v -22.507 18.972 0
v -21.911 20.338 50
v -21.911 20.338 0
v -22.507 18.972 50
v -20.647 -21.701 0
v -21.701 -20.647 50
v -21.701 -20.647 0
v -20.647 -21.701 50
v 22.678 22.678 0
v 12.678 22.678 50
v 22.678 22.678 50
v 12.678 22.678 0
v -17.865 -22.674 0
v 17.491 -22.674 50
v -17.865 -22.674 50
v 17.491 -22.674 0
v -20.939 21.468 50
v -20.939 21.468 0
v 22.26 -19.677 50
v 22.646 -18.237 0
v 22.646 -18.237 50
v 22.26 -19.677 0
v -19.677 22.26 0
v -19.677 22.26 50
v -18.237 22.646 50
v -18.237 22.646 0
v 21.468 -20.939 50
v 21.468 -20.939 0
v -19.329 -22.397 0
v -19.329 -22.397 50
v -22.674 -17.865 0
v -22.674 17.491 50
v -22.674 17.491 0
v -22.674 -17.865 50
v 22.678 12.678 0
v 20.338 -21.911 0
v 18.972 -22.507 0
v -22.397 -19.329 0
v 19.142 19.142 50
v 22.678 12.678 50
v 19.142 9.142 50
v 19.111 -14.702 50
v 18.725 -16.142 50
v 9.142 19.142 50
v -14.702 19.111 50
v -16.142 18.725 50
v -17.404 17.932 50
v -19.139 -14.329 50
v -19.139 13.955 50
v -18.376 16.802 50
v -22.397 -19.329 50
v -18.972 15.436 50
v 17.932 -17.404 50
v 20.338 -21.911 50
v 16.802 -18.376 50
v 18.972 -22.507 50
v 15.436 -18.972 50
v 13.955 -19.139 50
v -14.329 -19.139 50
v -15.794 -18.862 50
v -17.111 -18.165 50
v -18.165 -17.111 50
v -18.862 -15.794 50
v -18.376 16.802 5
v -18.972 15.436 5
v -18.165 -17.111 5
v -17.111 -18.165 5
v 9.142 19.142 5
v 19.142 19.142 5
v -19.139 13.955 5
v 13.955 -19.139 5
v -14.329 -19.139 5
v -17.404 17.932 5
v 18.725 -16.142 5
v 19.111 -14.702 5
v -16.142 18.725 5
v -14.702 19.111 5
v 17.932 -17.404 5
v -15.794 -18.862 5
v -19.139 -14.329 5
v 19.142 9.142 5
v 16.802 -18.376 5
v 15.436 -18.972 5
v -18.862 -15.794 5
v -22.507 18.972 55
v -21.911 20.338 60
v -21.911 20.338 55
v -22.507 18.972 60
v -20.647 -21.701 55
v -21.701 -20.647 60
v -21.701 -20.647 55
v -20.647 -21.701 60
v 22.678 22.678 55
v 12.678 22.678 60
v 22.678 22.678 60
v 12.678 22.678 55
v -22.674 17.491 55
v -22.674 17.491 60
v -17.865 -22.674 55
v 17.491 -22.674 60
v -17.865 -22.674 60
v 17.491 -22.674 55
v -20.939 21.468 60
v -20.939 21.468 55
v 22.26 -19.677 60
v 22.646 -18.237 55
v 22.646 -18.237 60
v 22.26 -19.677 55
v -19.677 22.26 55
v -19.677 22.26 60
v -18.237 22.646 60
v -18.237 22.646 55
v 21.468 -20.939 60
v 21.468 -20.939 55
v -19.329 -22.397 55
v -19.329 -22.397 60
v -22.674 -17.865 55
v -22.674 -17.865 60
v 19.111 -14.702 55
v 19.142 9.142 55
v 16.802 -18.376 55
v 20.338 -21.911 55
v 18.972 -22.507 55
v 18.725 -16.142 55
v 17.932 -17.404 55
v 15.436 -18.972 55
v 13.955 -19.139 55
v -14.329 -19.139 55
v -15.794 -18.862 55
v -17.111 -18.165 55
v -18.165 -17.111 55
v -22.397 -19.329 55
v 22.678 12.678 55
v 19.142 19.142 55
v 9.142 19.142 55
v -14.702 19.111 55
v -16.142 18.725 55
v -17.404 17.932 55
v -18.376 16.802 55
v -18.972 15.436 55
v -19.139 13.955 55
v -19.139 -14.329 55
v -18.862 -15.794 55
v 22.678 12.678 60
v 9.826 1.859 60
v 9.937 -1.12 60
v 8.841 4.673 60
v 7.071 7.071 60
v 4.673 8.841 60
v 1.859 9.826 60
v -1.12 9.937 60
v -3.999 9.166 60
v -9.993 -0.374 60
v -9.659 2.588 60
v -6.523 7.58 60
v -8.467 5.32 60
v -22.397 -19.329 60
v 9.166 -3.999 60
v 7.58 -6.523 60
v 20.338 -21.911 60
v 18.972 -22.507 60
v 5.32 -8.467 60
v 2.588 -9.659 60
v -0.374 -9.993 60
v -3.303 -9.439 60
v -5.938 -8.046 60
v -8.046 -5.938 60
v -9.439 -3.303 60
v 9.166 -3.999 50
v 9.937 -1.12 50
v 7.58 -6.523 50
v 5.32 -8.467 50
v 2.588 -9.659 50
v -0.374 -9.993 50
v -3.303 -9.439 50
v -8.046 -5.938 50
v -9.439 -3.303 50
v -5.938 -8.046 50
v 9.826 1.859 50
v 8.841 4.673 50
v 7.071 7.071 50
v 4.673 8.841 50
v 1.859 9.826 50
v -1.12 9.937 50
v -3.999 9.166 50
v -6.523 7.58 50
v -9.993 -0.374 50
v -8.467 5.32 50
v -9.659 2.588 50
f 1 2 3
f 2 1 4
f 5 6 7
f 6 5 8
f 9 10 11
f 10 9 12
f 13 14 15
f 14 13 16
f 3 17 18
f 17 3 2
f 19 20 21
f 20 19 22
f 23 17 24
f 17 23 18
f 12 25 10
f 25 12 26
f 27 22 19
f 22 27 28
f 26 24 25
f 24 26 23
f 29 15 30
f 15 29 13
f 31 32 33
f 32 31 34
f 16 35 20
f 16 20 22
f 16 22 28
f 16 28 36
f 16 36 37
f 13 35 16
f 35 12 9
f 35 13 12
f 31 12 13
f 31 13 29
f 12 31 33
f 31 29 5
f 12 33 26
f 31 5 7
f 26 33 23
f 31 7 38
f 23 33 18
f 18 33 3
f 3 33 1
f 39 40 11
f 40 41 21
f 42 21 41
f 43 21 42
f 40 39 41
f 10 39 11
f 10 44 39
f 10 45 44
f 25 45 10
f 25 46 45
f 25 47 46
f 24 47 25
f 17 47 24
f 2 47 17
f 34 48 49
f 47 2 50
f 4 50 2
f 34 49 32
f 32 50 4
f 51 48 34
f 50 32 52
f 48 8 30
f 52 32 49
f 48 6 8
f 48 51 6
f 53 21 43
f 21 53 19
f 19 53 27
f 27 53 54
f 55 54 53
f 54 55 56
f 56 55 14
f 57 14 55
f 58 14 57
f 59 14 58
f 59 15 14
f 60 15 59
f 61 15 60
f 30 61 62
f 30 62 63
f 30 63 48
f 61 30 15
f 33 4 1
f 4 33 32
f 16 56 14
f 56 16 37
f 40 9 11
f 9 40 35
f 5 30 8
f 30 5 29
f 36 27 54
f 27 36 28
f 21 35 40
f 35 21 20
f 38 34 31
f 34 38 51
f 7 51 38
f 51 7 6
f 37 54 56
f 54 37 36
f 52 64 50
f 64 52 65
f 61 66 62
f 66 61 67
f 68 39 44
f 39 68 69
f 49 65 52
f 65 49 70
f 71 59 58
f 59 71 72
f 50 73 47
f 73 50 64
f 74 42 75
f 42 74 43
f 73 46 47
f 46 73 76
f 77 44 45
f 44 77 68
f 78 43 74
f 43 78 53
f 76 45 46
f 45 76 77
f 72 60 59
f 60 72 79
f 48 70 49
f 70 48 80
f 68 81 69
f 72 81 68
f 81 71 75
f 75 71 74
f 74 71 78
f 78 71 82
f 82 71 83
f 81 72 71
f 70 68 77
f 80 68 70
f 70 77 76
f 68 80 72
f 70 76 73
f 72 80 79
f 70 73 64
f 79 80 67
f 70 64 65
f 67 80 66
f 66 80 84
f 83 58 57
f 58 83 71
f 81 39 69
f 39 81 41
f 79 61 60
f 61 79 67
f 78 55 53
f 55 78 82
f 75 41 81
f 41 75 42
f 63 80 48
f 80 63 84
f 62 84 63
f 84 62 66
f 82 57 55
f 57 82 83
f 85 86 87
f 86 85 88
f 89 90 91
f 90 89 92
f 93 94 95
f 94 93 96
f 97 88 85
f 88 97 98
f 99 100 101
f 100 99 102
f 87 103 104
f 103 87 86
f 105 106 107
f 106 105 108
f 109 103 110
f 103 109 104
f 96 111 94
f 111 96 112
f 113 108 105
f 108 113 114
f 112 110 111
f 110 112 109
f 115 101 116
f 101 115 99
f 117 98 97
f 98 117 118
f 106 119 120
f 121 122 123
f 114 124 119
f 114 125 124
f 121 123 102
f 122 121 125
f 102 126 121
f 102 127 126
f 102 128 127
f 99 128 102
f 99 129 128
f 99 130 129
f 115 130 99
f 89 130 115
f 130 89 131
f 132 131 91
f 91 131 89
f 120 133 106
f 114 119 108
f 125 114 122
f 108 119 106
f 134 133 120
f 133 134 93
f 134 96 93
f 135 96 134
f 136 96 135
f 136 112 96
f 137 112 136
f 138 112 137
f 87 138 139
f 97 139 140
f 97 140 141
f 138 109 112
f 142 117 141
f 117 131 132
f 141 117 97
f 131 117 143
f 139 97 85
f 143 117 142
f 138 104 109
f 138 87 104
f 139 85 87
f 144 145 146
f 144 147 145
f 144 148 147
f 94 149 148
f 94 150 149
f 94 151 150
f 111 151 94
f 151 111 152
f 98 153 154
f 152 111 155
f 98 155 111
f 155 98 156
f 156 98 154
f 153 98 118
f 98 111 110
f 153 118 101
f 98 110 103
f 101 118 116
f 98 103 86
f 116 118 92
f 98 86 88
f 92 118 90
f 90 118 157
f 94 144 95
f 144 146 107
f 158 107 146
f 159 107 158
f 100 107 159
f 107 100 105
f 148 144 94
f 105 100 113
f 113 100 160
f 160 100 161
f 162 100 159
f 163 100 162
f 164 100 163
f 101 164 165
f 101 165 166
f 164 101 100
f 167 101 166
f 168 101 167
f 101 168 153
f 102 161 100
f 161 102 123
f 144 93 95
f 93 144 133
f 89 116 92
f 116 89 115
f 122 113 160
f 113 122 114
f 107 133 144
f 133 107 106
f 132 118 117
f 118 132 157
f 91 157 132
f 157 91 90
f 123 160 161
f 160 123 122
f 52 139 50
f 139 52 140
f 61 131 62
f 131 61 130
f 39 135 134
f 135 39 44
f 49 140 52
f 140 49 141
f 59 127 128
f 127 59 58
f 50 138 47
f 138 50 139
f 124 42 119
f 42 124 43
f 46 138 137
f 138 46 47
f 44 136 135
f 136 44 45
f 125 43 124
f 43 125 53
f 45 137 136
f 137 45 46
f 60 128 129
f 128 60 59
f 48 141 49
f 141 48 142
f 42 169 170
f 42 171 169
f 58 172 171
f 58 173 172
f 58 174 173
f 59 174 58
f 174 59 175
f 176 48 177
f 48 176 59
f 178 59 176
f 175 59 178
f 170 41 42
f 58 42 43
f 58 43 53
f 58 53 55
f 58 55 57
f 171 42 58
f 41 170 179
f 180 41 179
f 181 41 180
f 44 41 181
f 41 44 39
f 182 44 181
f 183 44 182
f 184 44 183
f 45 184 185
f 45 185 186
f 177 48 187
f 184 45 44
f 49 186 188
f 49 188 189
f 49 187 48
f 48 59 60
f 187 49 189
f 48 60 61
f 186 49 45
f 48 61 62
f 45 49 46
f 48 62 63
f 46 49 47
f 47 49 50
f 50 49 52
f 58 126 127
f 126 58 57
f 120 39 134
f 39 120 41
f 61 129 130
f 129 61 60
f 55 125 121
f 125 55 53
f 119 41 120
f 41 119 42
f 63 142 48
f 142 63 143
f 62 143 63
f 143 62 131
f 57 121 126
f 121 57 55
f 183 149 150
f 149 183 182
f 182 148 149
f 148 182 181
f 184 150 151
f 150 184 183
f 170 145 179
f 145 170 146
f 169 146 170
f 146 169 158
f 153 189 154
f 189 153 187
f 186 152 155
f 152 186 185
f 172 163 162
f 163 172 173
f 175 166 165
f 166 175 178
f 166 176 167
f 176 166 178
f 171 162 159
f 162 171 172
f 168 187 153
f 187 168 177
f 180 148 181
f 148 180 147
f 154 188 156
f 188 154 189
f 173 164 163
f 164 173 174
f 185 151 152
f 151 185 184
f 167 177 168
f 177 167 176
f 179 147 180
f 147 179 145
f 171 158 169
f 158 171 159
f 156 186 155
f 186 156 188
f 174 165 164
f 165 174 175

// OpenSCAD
$fn=21;
$use_42sol_nodge = true;
$use_lid_hole = true;
$show_box = true;
$show_lid = true;
$height = 50.0; // height of box
$wall_thikness = 5; // thikness of wall and bottom
$box_size = 6.0; // size of the box
$box_r_corner = 5.0; // corner radius of the box

module core_2d (width = 20, r_corner=5) {
    offset = width / 2;
    if(r_corner > offset) {
        use_r_corner = (offset / 10.0);
        call_core_2d(offset, offset/10.0);
        echo("........reset corner radius (r_corner) %d", use_r_corner);
    
    } else {
       call_core_2d(offset, r_corner);
    } 
}

module call_core_2d(offset,r_corner) {
    if($use_42sol_nodge) translate([offset,0,0]) circle(r_corner*sqrt(2),$fn=4);
    else translate([offset,0,0])  circle(r_corner);
    translate([-offset,0,0]) circle(r_corner);
    translate([0,offset,0]) circle(r_corner);
    translate([0,-offset,0]) circle(r_corner);
}//module call 2d

module core (width=100, r_corner=10) {
hull () core_2d(width,r_corner);
}

module box(size=50) {
    difference() {
        linear_extrude($height) {
           core(50,$box_r_corner);
        }
        translate([0,0,$wall_thikness]) linear_extrude($height) {
            core(50-2*$wall_thikness,$box_r_corner);
        }
    }
}

module lid(size=50) {
        translate([0,0,$height+$wall_thikness]) linear_extrude($wall_thikness) {
           core(50,$box_r_corner);
        }
        translate([0,0,$height]) linear_extrude($wall_thikness*2) {
            core(50-2*$wall_thikness,$box_r_corner);
        }
}




module main() {
    if($show_box) box($box_size);
    if($show_lid) #difference() {
        lid($box_size);
        cylinder(200,r=$box_r_corner*2.0);
    }

}

rotate([0,0,45]) main();
//rotate([0,0,45]) core(50,24);
